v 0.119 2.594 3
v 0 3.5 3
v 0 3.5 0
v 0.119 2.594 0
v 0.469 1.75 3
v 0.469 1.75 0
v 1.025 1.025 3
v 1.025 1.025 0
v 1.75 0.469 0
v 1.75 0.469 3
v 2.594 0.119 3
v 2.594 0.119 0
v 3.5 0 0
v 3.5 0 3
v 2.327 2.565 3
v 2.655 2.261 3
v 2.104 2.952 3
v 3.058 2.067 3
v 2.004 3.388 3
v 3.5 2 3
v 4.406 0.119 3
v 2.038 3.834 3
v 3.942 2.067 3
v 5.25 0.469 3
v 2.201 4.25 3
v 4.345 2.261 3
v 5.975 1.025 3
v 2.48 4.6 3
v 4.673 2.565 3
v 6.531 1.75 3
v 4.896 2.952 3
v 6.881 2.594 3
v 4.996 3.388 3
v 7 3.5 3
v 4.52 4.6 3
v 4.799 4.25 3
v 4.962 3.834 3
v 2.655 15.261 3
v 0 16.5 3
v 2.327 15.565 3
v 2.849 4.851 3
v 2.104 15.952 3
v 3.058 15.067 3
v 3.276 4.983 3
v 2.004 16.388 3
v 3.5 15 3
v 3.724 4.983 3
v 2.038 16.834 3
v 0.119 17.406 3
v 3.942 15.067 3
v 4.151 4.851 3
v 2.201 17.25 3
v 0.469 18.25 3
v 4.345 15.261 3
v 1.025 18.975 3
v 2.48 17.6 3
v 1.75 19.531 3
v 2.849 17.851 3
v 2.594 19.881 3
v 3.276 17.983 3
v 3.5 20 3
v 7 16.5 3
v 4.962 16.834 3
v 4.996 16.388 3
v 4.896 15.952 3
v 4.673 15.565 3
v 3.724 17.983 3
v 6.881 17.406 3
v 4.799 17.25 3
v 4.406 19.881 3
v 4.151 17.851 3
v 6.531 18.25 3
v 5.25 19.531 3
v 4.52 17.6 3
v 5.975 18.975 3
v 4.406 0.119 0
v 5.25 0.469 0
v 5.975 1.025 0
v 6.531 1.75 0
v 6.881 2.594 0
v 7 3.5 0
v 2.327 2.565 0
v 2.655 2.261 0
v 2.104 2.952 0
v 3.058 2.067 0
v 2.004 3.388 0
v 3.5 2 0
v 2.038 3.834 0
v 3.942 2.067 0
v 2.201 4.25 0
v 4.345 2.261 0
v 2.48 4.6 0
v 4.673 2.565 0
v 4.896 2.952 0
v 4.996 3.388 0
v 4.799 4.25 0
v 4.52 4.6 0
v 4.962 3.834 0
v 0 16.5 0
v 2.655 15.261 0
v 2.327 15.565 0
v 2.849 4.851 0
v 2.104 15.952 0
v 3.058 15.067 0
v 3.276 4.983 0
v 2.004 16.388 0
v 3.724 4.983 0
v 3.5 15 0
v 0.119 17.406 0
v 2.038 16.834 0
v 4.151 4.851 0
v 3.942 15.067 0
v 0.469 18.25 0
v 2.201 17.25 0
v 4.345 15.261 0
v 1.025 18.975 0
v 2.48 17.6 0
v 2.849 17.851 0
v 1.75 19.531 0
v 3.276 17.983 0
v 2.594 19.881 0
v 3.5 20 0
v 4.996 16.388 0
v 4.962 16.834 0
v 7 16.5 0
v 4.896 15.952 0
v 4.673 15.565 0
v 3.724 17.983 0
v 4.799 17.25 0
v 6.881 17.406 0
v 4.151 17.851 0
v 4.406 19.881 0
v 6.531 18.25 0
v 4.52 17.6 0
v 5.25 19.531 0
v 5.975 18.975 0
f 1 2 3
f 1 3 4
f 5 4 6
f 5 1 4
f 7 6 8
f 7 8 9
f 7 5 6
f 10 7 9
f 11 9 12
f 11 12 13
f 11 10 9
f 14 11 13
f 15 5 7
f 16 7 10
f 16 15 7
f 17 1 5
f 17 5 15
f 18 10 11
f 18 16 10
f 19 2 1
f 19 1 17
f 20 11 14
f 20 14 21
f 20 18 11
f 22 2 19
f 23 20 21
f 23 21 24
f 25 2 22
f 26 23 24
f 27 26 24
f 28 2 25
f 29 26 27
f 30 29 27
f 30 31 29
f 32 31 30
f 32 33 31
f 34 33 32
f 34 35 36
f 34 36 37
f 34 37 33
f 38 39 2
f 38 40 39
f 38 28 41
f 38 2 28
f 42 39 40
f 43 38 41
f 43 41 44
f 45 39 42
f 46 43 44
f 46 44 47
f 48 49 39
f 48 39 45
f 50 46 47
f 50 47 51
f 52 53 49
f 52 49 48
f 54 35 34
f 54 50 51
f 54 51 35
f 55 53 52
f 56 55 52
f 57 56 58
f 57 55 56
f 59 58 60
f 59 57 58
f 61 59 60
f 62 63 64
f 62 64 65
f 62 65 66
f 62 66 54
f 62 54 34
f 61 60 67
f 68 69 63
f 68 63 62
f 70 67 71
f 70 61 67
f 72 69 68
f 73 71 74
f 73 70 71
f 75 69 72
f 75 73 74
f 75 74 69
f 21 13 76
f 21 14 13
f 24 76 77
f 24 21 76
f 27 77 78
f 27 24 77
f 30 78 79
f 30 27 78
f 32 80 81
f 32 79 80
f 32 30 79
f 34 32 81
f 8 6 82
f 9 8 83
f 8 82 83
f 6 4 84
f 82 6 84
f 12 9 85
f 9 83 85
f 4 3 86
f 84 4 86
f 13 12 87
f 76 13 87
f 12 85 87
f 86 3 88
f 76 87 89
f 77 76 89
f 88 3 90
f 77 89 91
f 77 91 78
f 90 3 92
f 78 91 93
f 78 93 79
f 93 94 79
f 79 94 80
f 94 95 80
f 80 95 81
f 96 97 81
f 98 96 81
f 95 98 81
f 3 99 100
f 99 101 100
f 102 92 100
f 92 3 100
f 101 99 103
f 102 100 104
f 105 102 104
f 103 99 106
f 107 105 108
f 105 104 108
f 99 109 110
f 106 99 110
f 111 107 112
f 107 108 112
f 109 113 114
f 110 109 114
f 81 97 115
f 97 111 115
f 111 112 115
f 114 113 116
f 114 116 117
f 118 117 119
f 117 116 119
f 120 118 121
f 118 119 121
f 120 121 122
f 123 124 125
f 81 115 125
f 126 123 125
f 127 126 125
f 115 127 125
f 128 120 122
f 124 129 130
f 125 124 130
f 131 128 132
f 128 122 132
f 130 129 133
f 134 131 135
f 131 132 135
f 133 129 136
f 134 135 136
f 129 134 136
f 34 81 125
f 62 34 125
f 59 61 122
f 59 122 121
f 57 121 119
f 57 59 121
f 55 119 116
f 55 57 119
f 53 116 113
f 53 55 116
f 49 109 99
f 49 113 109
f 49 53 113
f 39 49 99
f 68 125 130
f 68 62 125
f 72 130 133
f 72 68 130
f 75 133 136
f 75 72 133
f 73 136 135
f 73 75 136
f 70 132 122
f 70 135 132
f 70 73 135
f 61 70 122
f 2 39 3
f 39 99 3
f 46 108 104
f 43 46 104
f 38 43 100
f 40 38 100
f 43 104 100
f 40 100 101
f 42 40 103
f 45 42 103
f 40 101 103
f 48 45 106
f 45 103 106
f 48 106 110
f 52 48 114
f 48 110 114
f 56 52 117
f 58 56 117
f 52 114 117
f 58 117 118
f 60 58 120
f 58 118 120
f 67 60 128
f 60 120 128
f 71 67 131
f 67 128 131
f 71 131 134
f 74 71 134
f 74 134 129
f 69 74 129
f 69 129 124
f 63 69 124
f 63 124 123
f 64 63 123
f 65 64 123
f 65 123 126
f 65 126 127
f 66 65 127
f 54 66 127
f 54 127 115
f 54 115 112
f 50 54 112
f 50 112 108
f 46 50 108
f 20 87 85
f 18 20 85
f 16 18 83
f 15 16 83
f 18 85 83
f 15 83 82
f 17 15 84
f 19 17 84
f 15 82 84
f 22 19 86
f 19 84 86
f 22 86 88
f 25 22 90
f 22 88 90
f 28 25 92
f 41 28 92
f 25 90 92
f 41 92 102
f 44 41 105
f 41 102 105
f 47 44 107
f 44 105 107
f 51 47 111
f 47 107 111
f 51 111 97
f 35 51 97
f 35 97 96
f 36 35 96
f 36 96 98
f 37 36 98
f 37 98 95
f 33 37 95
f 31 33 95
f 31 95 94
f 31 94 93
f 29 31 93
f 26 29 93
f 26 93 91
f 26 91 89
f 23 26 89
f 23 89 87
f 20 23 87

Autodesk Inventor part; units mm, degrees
ref_plane "YZ Plane" through (0, 0, 0) normal (1, 0, 0) x (0, 1, 0)
ref_plane "XZ Plane" through (0, 0, 0) normal (0, 1, 0) x (-1, 0, 0)
ref_plane "XY Plane" through (0, 0, 0) normal (0, 0, 1) x (1, 0, 0)
sketch "Sketch1" plane through (0, 0, 0) normal (0, 0, 1) x (1, 0, 0)
  line L0 (0, 0) -> (7, 0)
  line L1 (7, 0) -> (7, 20)
  line L2 (7, 20) -> (0, 20)
  line L3 (0, 20) -> (0, 0)
  dimension "d0" = 7
  dimension "d1" = 20
extrude "Extrusion1" add sketch "Sketch1" along normal blind 3
fillet "Fillet1" radius 3.5 4 edges at (0, 0, 1.5) (7, 0, 1.5) (0, 20, 1.5) (7, 20, 1.5)
sketch "Sketch2" plane through (0, 0, 3) normal (0, 0, 1) x (1, 0, 0)
  arc A0 (7, 16.5) -> (0, 16.5) centre (3.5, 16.5) ccw projected
  arc A1 (0, 3.5) -> (7, 3.5) centre (3.5, 3.5) ccw projected
hole "Hole1" at (3.5, 3.5, 3) at (3.5, 16.5, 3) direction (0, 0, -1) diameter 3 end through all
properties part number "plastic_part_13"
